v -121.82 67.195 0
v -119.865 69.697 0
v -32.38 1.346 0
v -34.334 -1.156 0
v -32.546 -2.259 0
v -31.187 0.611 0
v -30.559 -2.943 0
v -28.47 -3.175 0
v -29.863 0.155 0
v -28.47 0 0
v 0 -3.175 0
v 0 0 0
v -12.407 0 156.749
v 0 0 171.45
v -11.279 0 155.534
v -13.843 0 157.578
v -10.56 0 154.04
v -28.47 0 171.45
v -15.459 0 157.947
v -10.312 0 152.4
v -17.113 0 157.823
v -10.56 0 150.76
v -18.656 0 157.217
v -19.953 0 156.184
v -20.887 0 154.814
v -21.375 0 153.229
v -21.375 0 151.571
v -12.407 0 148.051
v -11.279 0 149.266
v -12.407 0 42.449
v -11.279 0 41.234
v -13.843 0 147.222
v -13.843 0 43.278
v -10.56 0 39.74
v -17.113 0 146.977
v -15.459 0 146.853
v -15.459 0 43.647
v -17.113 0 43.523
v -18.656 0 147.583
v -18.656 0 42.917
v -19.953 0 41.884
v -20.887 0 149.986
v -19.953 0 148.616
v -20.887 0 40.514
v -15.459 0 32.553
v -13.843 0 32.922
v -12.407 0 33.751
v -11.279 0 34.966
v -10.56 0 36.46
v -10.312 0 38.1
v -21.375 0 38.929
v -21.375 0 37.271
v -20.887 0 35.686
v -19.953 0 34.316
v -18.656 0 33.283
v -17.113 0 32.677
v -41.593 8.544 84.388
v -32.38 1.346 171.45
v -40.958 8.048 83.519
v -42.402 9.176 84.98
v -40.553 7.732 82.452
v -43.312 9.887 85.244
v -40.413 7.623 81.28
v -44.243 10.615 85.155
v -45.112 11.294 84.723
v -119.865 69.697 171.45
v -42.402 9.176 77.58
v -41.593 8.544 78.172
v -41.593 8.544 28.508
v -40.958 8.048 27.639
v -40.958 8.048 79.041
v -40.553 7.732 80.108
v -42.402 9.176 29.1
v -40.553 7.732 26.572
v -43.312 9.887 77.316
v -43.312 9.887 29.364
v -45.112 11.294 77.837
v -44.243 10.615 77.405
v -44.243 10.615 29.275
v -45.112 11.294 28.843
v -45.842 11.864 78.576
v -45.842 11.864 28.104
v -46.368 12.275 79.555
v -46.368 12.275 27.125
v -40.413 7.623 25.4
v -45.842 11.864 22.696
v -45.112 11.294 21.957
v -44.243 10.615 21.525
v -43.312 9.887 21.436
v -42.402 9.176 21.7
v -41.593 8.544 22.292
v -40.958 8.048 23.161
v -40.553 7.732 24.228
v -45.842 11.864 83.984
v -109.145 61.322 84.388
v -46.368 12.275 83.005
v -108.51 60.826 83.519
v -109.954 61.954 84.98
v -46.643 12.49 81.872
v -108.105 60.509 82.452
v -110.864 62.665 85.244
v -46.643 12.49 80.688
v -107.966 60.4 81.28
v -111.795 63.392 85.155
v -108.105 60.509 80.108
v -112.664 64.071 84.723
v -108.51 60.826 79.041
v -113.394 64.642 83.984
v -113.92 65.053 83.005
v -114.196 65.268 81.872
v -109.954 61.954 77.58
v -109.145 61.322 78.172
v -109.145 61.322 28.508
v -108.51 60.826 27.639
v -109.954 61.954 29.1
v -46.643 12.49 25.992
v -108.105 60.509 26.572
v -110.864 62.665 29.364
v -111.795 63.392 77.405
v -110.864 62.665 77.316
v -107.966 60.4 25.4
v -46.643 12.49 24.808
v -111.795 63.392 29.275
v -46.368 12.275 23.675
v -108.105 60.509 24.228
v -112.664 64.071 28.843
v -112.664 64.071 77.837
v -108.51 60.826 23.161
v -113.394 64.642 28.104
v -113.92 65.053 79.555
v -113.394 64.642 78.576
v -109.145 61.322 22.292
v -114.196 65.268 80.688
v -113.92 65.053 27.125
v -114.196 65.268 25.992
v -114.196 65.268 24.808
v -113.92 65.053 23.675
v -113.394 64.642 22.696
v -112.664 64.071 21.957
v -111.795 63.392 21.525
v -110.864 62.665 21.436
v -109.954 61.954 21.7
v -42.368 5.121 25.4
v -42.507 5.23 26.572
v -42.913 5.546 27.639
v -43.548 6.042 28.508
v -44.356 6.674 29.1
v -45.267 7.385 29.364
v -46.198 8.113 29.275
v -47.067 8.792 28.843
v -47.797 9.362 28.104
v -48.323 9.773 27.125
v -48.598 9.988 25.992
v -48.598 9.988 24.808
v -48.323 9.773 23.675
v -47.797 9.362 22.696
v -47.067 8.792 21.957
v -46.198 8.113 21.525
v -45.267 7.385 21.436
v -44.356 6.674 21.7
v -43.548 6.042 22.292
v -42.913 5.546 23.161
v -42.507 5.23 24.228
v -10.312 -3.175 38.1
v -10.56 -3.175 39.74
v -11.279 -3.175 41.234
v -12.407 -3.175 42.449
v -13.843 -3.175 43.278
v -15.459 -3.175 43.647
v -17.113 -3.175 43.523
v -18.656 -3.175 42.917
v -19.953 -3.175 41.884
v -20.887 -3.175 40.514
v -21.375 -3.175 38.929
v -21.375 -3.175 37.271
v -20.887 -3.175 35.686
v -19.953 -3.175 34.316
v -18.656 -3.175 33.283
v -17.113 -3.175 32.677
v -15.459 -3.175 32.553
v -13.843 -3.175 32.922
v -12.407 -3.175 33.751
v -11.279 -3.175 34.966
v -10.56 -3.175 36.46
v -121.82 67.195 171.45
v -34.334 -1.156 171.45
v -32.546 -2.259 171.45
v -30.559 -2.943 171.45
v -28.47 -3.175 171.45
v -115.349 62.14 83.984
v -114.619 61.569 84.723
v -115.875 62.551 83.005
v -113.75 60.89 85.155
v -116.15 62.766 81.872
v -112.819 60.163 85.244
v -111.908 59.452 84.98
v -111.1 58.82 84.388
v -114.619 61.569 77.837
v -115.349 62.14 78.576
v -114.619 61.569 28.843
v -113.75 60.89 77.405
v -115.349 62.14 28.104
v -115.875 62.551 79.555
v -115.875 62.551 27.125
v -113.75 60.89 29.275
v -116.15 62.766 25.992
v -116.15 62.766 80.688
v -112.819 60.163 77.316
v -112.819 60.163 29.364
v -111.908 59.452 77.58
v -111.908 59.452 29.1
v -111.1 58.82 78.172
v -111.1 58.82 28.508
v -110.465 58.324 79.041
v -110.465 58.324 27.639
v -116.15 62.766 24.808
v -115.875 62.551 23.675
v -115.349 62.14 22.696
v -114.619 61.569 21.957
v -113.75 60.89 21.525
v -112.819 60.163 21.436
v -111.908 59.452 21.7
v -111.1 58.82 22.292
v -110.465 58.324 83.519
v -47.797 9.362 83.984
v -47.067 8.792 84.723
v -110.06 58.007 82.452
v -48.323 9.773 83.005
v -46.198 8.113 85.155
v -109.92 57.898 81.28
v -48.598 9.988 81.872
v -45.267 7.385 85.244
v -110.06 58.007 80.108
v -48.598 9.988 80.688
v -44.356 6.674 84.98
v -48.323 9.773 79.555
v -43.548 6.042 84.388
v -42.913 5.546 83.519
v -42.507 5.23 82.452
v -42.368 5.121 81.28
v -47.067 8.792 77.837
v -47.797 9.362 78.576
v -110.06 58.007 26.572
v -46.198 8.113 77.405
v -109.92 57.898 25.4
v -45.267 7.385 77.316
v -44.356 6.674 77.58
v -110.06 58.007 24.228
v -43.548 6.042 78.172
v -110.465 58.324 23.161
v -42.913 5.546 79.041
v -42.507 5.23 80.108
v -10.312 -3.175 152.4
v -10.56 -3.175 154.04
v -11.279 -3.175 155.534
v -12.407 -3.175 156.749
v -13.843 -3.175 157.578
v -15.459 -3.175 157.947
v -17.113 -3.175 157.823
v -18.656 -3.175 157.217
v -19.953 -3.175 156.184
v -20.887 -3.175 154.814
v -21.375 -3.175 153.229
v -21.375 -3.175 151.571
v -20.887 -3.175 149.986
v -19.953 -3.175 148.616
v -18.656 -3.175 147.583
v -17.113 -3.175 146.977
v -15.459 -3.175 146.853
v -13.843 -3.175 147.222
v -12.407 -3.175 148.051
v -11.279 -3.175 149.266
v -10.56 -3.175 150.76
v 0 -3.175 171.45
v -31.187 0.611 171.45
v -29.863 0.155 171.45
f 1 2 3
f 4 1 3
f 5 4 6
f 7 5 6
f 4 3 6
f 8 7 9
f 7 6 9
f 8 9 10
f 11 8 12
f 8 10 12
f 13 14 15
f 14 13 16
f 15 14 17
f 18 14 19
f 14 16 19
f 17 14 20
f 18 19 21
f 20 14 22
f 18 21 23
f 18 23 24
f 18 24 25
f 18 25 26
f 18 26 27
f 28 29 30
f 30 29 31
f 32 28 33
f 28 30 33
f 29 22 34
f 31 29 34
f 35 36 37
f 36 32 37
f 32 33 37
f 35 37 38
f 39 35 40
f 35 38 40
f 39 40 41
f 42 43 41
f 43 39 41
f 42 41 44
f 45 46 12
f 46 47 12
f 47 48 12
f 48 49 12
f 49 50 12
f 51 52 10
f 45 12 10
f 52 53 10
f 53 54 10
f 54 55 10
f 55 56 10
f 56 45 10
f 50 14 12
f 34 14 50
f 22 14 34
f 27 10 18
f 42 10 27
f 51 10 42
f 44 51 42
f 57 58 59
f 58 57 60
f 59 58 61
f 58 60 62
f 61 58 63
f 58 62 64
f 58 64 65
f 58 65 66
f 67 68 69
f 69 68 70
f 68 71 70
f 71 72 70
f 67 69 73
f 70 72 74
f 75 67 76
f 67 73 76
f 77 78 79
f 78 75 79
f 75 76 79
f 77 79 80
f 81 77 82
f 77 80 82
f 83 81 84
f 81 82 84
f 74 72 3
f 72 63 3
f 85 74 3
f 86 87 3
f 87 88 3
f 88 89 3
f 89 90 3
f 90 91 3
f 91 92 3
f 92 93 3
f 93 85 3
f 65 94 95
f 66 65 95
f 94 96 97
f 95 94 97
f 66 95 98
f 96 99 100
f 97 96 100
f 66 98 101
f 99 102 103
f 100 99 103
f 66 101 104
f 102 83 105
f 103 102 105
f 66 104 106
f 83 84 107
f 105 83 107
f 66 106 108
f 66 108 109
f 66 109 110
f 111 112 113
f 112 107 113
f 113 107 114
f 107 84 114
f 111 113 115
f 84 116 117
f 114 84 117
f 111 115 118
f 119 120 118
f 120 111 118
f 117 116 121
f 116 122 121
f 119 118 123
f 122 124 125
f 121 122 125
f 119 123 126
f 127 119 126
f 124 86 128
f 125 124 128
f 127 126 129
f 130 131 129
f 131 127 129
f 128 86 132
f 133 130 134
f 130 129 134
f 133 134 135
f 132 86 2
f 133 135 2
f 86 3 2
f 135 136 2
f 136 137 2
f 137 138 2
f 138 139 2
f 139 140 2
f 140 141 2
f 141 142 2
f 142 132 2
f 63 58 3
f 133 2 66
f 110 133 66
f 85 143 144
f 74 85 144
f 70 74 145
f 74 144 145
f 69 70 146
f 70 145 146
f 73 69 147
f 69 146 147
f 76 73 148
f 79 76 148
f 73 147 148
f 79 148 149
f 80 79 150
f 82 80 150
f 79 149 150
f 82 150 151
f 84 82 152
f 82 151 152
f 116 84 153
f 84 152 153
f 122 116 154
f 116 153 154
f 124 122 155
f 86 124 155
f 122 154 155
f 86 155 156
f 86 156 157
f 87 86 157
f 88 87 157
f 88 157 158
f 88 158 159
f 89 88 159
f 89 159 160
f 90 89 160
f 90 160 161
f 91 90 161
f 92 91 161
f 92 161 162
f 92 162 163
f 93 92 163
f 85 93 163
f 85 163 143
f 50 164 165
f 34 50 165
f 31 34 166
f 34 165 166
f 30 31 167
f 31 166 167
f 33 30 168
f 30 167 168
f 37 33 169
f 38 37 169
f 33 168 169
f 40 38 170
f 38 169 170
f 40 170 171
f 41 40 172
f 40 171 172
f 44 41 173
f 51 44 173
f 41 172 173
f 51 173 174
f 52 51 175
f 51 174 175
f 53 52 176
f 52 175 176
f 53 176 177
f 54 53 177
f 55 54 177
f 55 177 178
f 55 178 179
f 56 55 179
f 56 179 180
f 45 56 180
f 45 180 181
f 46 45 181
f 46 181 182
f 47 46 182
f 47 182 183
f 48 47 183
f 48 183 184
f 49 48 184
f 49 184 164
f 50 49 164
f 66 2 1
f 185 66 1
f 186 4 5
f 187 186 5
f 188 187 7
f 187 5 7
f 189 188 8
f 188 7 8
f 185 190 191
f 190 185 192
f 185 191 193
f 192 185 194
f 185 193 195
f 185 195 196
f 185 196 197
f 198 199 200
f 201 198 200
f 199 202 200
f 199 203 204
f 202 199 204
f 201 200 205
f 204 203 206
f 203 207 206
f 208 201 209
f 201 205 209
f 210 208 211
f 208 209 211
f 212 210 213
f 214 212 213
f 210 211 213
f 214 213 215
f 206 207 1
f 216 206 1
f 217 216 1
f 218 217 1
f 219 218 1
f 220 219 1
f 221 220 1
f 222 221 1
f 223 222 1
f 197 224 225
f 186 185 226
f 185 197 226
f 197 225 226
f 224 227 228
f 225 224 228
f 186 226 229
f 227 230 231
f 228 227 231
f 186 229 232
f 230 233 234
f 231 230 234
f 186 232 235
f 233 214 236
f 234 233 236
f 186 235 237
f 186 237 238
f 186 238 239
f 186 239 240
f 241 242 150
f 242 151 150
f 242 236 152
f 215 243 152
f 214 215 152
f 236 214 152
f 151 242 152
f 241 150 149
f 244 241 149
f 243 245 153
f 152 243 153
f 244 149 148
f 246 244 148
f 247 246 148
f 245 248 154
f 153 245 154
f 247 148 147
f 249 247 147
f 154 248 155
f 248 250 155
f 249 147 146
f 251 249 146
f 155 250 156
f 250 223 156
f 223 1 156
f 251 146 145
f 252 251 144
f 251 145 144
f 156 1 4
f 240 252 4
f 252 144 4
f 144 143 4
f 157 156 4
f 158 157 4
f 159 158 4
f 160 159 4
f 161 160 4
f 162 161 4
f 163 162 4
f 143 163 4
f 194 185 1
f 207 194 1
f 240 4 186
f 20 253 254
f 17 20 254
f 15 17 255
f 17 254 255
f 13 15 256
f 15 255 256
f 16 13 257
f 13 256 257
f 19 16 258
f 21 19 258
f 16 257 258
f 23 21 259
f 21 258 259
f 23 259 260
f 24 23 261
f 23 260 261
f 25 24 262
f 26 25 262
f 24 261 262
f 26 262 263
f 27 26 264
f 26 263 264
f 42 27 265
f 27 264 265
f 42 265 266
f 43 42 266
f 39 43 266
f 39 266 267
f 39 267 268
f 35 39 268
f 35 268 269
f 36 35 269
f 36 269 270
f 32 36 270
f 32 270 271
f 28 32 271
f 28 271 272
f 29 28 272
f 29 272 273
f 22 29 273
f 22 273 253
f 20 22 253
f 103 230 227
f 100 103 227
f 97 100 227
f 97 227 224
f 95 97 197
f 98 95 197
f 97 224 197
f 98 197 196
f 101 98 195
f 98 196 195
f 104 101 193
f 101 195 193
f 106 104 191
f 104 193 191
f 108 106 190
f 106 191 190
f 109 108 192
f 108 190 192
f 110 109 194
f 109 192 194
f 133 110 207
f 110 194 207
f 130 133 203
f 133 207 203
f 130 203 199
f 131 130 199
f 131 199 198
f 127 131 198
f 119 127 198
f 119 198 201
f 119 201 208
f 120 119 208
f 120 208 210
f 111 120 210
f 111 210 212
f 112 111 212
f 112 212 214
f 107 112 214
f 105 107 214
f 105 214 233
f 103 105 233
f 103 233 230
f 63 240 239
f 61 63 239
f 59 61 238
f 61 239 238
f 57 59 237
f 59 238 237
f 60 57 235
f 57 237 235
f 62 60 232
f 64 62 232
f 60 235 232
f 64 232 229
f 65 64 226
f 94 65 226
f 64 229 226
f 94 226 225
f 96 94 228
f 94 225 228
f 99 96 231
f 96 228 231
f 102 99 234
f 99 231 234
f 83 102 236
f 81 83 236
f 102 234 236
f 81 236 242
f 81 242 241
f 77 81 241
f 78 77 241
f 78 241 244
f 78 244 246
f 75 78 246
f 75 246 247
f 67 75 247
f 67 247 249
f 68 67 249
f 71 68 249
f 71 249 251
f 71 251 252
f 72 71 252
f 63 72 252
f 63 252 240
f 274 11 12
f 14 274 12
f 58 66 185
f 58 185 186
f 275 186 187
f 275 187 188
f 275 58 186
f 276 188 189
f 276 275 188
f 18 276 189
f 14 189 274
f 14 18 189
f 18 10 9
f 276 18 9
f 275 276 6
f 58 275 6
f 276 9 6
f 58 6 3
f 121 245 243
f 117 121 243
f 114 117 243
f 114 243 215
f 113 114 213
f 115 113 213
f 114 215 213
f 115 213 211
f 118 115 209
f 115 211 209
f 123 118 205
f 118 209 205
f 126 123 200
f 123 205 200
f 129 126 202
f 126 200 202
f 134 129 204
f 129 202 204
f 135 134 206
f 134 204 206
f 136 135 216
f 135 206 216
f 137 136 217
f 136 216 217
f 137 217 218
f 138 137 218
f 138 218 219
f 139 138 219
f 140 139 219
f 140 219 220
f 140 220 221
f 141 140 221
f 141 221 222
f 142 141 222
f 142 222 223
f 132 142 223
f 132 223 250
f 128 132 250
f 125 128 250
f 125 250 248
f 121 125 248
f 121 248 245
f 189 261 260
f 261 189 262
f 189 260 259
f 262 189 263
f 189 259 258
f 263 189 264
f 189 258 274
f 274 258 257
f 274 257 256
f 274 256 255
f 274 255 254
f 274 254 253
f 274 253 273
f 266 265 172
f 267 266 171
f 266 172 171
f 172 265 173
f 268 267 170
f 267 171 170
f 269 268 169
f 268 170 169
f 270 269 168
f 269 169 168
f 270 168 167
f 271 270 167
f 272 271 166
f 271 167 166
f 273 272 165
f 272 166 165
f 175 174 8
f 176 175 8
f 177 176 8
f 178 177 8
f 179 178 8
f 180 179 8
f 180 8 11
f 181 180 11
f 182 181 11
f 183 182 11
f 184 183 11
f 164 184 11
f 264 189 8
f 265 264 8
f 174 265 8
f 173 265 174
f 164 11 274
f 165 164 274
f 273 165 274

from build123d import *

# Parameters (mm, degrees)
F1_DEPTH = 171.45
F2_R     = 5.5626
F3_DEPTH = 72.8730407724
F4_R     = 3.9751
F5_DEPTH = 76.9722036075


# Not quite as in the source:
# - a feature of the source that left no trace in its solid (it failed there, or was rolled back) is left out


with BuildPart() as f1:
    # F0 (on Top) → F1 (new body)
    with BuildSketch(Plane.XY):
        with BuildLine():
            Line((0, -3.175), (0, 0))
            Line((0, 0), (-28.4702794834, 0))
            ThreePointArc((-28.4702794834, 0), (-30.5376372642, 0.3459570449), (-32.3797298517, 1.3461317146))
            Line((-32.3797298517, 1.3461317146), (-119.8649039531, 69.6970407724))
            Line((-119.8649039531, 69.6970407724), (-121.8196291372, 67.1951066297))
            Line((-121.8196291372, 67.1951066297), (-34.3344550359, -1.1558024281))
            ThreePointArc((-34.3344550359, -1.1558024281), (-31.5713161546, -2.6560644326), (-28.4702794834, -3.175))
            Line((-28.4702794834, -3.175), (0, -3.175))
        make_face()
    extrude(amount=F1_DEPTH)

    # F2 (on face) → F3 (cut, through all)
    with BuildSketch(Plane.XZ.offset(3.175)):
        with Locations((-15.875, 152.4)):
            Circle(F2_R)
        with Locations((-15.875, 38.1)):
            Circle(F2_R)
    extrude(amount=-F3_DEPTH, mode=Mode.SUBTRACT)

    # F4 (on face) → F5 (cut, through all)
    with BuildSketch(Plane(origin=(-13.5748343728, -17.3749956639, 0), x_dir=(0.7880107536, -0.6156614753, 0), z_dir=(-0.6156614753, -0.7880107536, 0))):
        with Locations((-126.2394162429, 81.28)):
            Circle(F4_R)
        with Locations((-40.5144162429, 81.28)):
            Circle(F4_R)
        with Locations((-40.5144162429, 25.4)):
            Circle(F4_R)
        with Locations((-126.2394162429, 25.4)):
            Circle(F4_R)
    extrude(amount=-F5_DEPTH, mode=Mode.SUBTRACT)


solid = f1.part
